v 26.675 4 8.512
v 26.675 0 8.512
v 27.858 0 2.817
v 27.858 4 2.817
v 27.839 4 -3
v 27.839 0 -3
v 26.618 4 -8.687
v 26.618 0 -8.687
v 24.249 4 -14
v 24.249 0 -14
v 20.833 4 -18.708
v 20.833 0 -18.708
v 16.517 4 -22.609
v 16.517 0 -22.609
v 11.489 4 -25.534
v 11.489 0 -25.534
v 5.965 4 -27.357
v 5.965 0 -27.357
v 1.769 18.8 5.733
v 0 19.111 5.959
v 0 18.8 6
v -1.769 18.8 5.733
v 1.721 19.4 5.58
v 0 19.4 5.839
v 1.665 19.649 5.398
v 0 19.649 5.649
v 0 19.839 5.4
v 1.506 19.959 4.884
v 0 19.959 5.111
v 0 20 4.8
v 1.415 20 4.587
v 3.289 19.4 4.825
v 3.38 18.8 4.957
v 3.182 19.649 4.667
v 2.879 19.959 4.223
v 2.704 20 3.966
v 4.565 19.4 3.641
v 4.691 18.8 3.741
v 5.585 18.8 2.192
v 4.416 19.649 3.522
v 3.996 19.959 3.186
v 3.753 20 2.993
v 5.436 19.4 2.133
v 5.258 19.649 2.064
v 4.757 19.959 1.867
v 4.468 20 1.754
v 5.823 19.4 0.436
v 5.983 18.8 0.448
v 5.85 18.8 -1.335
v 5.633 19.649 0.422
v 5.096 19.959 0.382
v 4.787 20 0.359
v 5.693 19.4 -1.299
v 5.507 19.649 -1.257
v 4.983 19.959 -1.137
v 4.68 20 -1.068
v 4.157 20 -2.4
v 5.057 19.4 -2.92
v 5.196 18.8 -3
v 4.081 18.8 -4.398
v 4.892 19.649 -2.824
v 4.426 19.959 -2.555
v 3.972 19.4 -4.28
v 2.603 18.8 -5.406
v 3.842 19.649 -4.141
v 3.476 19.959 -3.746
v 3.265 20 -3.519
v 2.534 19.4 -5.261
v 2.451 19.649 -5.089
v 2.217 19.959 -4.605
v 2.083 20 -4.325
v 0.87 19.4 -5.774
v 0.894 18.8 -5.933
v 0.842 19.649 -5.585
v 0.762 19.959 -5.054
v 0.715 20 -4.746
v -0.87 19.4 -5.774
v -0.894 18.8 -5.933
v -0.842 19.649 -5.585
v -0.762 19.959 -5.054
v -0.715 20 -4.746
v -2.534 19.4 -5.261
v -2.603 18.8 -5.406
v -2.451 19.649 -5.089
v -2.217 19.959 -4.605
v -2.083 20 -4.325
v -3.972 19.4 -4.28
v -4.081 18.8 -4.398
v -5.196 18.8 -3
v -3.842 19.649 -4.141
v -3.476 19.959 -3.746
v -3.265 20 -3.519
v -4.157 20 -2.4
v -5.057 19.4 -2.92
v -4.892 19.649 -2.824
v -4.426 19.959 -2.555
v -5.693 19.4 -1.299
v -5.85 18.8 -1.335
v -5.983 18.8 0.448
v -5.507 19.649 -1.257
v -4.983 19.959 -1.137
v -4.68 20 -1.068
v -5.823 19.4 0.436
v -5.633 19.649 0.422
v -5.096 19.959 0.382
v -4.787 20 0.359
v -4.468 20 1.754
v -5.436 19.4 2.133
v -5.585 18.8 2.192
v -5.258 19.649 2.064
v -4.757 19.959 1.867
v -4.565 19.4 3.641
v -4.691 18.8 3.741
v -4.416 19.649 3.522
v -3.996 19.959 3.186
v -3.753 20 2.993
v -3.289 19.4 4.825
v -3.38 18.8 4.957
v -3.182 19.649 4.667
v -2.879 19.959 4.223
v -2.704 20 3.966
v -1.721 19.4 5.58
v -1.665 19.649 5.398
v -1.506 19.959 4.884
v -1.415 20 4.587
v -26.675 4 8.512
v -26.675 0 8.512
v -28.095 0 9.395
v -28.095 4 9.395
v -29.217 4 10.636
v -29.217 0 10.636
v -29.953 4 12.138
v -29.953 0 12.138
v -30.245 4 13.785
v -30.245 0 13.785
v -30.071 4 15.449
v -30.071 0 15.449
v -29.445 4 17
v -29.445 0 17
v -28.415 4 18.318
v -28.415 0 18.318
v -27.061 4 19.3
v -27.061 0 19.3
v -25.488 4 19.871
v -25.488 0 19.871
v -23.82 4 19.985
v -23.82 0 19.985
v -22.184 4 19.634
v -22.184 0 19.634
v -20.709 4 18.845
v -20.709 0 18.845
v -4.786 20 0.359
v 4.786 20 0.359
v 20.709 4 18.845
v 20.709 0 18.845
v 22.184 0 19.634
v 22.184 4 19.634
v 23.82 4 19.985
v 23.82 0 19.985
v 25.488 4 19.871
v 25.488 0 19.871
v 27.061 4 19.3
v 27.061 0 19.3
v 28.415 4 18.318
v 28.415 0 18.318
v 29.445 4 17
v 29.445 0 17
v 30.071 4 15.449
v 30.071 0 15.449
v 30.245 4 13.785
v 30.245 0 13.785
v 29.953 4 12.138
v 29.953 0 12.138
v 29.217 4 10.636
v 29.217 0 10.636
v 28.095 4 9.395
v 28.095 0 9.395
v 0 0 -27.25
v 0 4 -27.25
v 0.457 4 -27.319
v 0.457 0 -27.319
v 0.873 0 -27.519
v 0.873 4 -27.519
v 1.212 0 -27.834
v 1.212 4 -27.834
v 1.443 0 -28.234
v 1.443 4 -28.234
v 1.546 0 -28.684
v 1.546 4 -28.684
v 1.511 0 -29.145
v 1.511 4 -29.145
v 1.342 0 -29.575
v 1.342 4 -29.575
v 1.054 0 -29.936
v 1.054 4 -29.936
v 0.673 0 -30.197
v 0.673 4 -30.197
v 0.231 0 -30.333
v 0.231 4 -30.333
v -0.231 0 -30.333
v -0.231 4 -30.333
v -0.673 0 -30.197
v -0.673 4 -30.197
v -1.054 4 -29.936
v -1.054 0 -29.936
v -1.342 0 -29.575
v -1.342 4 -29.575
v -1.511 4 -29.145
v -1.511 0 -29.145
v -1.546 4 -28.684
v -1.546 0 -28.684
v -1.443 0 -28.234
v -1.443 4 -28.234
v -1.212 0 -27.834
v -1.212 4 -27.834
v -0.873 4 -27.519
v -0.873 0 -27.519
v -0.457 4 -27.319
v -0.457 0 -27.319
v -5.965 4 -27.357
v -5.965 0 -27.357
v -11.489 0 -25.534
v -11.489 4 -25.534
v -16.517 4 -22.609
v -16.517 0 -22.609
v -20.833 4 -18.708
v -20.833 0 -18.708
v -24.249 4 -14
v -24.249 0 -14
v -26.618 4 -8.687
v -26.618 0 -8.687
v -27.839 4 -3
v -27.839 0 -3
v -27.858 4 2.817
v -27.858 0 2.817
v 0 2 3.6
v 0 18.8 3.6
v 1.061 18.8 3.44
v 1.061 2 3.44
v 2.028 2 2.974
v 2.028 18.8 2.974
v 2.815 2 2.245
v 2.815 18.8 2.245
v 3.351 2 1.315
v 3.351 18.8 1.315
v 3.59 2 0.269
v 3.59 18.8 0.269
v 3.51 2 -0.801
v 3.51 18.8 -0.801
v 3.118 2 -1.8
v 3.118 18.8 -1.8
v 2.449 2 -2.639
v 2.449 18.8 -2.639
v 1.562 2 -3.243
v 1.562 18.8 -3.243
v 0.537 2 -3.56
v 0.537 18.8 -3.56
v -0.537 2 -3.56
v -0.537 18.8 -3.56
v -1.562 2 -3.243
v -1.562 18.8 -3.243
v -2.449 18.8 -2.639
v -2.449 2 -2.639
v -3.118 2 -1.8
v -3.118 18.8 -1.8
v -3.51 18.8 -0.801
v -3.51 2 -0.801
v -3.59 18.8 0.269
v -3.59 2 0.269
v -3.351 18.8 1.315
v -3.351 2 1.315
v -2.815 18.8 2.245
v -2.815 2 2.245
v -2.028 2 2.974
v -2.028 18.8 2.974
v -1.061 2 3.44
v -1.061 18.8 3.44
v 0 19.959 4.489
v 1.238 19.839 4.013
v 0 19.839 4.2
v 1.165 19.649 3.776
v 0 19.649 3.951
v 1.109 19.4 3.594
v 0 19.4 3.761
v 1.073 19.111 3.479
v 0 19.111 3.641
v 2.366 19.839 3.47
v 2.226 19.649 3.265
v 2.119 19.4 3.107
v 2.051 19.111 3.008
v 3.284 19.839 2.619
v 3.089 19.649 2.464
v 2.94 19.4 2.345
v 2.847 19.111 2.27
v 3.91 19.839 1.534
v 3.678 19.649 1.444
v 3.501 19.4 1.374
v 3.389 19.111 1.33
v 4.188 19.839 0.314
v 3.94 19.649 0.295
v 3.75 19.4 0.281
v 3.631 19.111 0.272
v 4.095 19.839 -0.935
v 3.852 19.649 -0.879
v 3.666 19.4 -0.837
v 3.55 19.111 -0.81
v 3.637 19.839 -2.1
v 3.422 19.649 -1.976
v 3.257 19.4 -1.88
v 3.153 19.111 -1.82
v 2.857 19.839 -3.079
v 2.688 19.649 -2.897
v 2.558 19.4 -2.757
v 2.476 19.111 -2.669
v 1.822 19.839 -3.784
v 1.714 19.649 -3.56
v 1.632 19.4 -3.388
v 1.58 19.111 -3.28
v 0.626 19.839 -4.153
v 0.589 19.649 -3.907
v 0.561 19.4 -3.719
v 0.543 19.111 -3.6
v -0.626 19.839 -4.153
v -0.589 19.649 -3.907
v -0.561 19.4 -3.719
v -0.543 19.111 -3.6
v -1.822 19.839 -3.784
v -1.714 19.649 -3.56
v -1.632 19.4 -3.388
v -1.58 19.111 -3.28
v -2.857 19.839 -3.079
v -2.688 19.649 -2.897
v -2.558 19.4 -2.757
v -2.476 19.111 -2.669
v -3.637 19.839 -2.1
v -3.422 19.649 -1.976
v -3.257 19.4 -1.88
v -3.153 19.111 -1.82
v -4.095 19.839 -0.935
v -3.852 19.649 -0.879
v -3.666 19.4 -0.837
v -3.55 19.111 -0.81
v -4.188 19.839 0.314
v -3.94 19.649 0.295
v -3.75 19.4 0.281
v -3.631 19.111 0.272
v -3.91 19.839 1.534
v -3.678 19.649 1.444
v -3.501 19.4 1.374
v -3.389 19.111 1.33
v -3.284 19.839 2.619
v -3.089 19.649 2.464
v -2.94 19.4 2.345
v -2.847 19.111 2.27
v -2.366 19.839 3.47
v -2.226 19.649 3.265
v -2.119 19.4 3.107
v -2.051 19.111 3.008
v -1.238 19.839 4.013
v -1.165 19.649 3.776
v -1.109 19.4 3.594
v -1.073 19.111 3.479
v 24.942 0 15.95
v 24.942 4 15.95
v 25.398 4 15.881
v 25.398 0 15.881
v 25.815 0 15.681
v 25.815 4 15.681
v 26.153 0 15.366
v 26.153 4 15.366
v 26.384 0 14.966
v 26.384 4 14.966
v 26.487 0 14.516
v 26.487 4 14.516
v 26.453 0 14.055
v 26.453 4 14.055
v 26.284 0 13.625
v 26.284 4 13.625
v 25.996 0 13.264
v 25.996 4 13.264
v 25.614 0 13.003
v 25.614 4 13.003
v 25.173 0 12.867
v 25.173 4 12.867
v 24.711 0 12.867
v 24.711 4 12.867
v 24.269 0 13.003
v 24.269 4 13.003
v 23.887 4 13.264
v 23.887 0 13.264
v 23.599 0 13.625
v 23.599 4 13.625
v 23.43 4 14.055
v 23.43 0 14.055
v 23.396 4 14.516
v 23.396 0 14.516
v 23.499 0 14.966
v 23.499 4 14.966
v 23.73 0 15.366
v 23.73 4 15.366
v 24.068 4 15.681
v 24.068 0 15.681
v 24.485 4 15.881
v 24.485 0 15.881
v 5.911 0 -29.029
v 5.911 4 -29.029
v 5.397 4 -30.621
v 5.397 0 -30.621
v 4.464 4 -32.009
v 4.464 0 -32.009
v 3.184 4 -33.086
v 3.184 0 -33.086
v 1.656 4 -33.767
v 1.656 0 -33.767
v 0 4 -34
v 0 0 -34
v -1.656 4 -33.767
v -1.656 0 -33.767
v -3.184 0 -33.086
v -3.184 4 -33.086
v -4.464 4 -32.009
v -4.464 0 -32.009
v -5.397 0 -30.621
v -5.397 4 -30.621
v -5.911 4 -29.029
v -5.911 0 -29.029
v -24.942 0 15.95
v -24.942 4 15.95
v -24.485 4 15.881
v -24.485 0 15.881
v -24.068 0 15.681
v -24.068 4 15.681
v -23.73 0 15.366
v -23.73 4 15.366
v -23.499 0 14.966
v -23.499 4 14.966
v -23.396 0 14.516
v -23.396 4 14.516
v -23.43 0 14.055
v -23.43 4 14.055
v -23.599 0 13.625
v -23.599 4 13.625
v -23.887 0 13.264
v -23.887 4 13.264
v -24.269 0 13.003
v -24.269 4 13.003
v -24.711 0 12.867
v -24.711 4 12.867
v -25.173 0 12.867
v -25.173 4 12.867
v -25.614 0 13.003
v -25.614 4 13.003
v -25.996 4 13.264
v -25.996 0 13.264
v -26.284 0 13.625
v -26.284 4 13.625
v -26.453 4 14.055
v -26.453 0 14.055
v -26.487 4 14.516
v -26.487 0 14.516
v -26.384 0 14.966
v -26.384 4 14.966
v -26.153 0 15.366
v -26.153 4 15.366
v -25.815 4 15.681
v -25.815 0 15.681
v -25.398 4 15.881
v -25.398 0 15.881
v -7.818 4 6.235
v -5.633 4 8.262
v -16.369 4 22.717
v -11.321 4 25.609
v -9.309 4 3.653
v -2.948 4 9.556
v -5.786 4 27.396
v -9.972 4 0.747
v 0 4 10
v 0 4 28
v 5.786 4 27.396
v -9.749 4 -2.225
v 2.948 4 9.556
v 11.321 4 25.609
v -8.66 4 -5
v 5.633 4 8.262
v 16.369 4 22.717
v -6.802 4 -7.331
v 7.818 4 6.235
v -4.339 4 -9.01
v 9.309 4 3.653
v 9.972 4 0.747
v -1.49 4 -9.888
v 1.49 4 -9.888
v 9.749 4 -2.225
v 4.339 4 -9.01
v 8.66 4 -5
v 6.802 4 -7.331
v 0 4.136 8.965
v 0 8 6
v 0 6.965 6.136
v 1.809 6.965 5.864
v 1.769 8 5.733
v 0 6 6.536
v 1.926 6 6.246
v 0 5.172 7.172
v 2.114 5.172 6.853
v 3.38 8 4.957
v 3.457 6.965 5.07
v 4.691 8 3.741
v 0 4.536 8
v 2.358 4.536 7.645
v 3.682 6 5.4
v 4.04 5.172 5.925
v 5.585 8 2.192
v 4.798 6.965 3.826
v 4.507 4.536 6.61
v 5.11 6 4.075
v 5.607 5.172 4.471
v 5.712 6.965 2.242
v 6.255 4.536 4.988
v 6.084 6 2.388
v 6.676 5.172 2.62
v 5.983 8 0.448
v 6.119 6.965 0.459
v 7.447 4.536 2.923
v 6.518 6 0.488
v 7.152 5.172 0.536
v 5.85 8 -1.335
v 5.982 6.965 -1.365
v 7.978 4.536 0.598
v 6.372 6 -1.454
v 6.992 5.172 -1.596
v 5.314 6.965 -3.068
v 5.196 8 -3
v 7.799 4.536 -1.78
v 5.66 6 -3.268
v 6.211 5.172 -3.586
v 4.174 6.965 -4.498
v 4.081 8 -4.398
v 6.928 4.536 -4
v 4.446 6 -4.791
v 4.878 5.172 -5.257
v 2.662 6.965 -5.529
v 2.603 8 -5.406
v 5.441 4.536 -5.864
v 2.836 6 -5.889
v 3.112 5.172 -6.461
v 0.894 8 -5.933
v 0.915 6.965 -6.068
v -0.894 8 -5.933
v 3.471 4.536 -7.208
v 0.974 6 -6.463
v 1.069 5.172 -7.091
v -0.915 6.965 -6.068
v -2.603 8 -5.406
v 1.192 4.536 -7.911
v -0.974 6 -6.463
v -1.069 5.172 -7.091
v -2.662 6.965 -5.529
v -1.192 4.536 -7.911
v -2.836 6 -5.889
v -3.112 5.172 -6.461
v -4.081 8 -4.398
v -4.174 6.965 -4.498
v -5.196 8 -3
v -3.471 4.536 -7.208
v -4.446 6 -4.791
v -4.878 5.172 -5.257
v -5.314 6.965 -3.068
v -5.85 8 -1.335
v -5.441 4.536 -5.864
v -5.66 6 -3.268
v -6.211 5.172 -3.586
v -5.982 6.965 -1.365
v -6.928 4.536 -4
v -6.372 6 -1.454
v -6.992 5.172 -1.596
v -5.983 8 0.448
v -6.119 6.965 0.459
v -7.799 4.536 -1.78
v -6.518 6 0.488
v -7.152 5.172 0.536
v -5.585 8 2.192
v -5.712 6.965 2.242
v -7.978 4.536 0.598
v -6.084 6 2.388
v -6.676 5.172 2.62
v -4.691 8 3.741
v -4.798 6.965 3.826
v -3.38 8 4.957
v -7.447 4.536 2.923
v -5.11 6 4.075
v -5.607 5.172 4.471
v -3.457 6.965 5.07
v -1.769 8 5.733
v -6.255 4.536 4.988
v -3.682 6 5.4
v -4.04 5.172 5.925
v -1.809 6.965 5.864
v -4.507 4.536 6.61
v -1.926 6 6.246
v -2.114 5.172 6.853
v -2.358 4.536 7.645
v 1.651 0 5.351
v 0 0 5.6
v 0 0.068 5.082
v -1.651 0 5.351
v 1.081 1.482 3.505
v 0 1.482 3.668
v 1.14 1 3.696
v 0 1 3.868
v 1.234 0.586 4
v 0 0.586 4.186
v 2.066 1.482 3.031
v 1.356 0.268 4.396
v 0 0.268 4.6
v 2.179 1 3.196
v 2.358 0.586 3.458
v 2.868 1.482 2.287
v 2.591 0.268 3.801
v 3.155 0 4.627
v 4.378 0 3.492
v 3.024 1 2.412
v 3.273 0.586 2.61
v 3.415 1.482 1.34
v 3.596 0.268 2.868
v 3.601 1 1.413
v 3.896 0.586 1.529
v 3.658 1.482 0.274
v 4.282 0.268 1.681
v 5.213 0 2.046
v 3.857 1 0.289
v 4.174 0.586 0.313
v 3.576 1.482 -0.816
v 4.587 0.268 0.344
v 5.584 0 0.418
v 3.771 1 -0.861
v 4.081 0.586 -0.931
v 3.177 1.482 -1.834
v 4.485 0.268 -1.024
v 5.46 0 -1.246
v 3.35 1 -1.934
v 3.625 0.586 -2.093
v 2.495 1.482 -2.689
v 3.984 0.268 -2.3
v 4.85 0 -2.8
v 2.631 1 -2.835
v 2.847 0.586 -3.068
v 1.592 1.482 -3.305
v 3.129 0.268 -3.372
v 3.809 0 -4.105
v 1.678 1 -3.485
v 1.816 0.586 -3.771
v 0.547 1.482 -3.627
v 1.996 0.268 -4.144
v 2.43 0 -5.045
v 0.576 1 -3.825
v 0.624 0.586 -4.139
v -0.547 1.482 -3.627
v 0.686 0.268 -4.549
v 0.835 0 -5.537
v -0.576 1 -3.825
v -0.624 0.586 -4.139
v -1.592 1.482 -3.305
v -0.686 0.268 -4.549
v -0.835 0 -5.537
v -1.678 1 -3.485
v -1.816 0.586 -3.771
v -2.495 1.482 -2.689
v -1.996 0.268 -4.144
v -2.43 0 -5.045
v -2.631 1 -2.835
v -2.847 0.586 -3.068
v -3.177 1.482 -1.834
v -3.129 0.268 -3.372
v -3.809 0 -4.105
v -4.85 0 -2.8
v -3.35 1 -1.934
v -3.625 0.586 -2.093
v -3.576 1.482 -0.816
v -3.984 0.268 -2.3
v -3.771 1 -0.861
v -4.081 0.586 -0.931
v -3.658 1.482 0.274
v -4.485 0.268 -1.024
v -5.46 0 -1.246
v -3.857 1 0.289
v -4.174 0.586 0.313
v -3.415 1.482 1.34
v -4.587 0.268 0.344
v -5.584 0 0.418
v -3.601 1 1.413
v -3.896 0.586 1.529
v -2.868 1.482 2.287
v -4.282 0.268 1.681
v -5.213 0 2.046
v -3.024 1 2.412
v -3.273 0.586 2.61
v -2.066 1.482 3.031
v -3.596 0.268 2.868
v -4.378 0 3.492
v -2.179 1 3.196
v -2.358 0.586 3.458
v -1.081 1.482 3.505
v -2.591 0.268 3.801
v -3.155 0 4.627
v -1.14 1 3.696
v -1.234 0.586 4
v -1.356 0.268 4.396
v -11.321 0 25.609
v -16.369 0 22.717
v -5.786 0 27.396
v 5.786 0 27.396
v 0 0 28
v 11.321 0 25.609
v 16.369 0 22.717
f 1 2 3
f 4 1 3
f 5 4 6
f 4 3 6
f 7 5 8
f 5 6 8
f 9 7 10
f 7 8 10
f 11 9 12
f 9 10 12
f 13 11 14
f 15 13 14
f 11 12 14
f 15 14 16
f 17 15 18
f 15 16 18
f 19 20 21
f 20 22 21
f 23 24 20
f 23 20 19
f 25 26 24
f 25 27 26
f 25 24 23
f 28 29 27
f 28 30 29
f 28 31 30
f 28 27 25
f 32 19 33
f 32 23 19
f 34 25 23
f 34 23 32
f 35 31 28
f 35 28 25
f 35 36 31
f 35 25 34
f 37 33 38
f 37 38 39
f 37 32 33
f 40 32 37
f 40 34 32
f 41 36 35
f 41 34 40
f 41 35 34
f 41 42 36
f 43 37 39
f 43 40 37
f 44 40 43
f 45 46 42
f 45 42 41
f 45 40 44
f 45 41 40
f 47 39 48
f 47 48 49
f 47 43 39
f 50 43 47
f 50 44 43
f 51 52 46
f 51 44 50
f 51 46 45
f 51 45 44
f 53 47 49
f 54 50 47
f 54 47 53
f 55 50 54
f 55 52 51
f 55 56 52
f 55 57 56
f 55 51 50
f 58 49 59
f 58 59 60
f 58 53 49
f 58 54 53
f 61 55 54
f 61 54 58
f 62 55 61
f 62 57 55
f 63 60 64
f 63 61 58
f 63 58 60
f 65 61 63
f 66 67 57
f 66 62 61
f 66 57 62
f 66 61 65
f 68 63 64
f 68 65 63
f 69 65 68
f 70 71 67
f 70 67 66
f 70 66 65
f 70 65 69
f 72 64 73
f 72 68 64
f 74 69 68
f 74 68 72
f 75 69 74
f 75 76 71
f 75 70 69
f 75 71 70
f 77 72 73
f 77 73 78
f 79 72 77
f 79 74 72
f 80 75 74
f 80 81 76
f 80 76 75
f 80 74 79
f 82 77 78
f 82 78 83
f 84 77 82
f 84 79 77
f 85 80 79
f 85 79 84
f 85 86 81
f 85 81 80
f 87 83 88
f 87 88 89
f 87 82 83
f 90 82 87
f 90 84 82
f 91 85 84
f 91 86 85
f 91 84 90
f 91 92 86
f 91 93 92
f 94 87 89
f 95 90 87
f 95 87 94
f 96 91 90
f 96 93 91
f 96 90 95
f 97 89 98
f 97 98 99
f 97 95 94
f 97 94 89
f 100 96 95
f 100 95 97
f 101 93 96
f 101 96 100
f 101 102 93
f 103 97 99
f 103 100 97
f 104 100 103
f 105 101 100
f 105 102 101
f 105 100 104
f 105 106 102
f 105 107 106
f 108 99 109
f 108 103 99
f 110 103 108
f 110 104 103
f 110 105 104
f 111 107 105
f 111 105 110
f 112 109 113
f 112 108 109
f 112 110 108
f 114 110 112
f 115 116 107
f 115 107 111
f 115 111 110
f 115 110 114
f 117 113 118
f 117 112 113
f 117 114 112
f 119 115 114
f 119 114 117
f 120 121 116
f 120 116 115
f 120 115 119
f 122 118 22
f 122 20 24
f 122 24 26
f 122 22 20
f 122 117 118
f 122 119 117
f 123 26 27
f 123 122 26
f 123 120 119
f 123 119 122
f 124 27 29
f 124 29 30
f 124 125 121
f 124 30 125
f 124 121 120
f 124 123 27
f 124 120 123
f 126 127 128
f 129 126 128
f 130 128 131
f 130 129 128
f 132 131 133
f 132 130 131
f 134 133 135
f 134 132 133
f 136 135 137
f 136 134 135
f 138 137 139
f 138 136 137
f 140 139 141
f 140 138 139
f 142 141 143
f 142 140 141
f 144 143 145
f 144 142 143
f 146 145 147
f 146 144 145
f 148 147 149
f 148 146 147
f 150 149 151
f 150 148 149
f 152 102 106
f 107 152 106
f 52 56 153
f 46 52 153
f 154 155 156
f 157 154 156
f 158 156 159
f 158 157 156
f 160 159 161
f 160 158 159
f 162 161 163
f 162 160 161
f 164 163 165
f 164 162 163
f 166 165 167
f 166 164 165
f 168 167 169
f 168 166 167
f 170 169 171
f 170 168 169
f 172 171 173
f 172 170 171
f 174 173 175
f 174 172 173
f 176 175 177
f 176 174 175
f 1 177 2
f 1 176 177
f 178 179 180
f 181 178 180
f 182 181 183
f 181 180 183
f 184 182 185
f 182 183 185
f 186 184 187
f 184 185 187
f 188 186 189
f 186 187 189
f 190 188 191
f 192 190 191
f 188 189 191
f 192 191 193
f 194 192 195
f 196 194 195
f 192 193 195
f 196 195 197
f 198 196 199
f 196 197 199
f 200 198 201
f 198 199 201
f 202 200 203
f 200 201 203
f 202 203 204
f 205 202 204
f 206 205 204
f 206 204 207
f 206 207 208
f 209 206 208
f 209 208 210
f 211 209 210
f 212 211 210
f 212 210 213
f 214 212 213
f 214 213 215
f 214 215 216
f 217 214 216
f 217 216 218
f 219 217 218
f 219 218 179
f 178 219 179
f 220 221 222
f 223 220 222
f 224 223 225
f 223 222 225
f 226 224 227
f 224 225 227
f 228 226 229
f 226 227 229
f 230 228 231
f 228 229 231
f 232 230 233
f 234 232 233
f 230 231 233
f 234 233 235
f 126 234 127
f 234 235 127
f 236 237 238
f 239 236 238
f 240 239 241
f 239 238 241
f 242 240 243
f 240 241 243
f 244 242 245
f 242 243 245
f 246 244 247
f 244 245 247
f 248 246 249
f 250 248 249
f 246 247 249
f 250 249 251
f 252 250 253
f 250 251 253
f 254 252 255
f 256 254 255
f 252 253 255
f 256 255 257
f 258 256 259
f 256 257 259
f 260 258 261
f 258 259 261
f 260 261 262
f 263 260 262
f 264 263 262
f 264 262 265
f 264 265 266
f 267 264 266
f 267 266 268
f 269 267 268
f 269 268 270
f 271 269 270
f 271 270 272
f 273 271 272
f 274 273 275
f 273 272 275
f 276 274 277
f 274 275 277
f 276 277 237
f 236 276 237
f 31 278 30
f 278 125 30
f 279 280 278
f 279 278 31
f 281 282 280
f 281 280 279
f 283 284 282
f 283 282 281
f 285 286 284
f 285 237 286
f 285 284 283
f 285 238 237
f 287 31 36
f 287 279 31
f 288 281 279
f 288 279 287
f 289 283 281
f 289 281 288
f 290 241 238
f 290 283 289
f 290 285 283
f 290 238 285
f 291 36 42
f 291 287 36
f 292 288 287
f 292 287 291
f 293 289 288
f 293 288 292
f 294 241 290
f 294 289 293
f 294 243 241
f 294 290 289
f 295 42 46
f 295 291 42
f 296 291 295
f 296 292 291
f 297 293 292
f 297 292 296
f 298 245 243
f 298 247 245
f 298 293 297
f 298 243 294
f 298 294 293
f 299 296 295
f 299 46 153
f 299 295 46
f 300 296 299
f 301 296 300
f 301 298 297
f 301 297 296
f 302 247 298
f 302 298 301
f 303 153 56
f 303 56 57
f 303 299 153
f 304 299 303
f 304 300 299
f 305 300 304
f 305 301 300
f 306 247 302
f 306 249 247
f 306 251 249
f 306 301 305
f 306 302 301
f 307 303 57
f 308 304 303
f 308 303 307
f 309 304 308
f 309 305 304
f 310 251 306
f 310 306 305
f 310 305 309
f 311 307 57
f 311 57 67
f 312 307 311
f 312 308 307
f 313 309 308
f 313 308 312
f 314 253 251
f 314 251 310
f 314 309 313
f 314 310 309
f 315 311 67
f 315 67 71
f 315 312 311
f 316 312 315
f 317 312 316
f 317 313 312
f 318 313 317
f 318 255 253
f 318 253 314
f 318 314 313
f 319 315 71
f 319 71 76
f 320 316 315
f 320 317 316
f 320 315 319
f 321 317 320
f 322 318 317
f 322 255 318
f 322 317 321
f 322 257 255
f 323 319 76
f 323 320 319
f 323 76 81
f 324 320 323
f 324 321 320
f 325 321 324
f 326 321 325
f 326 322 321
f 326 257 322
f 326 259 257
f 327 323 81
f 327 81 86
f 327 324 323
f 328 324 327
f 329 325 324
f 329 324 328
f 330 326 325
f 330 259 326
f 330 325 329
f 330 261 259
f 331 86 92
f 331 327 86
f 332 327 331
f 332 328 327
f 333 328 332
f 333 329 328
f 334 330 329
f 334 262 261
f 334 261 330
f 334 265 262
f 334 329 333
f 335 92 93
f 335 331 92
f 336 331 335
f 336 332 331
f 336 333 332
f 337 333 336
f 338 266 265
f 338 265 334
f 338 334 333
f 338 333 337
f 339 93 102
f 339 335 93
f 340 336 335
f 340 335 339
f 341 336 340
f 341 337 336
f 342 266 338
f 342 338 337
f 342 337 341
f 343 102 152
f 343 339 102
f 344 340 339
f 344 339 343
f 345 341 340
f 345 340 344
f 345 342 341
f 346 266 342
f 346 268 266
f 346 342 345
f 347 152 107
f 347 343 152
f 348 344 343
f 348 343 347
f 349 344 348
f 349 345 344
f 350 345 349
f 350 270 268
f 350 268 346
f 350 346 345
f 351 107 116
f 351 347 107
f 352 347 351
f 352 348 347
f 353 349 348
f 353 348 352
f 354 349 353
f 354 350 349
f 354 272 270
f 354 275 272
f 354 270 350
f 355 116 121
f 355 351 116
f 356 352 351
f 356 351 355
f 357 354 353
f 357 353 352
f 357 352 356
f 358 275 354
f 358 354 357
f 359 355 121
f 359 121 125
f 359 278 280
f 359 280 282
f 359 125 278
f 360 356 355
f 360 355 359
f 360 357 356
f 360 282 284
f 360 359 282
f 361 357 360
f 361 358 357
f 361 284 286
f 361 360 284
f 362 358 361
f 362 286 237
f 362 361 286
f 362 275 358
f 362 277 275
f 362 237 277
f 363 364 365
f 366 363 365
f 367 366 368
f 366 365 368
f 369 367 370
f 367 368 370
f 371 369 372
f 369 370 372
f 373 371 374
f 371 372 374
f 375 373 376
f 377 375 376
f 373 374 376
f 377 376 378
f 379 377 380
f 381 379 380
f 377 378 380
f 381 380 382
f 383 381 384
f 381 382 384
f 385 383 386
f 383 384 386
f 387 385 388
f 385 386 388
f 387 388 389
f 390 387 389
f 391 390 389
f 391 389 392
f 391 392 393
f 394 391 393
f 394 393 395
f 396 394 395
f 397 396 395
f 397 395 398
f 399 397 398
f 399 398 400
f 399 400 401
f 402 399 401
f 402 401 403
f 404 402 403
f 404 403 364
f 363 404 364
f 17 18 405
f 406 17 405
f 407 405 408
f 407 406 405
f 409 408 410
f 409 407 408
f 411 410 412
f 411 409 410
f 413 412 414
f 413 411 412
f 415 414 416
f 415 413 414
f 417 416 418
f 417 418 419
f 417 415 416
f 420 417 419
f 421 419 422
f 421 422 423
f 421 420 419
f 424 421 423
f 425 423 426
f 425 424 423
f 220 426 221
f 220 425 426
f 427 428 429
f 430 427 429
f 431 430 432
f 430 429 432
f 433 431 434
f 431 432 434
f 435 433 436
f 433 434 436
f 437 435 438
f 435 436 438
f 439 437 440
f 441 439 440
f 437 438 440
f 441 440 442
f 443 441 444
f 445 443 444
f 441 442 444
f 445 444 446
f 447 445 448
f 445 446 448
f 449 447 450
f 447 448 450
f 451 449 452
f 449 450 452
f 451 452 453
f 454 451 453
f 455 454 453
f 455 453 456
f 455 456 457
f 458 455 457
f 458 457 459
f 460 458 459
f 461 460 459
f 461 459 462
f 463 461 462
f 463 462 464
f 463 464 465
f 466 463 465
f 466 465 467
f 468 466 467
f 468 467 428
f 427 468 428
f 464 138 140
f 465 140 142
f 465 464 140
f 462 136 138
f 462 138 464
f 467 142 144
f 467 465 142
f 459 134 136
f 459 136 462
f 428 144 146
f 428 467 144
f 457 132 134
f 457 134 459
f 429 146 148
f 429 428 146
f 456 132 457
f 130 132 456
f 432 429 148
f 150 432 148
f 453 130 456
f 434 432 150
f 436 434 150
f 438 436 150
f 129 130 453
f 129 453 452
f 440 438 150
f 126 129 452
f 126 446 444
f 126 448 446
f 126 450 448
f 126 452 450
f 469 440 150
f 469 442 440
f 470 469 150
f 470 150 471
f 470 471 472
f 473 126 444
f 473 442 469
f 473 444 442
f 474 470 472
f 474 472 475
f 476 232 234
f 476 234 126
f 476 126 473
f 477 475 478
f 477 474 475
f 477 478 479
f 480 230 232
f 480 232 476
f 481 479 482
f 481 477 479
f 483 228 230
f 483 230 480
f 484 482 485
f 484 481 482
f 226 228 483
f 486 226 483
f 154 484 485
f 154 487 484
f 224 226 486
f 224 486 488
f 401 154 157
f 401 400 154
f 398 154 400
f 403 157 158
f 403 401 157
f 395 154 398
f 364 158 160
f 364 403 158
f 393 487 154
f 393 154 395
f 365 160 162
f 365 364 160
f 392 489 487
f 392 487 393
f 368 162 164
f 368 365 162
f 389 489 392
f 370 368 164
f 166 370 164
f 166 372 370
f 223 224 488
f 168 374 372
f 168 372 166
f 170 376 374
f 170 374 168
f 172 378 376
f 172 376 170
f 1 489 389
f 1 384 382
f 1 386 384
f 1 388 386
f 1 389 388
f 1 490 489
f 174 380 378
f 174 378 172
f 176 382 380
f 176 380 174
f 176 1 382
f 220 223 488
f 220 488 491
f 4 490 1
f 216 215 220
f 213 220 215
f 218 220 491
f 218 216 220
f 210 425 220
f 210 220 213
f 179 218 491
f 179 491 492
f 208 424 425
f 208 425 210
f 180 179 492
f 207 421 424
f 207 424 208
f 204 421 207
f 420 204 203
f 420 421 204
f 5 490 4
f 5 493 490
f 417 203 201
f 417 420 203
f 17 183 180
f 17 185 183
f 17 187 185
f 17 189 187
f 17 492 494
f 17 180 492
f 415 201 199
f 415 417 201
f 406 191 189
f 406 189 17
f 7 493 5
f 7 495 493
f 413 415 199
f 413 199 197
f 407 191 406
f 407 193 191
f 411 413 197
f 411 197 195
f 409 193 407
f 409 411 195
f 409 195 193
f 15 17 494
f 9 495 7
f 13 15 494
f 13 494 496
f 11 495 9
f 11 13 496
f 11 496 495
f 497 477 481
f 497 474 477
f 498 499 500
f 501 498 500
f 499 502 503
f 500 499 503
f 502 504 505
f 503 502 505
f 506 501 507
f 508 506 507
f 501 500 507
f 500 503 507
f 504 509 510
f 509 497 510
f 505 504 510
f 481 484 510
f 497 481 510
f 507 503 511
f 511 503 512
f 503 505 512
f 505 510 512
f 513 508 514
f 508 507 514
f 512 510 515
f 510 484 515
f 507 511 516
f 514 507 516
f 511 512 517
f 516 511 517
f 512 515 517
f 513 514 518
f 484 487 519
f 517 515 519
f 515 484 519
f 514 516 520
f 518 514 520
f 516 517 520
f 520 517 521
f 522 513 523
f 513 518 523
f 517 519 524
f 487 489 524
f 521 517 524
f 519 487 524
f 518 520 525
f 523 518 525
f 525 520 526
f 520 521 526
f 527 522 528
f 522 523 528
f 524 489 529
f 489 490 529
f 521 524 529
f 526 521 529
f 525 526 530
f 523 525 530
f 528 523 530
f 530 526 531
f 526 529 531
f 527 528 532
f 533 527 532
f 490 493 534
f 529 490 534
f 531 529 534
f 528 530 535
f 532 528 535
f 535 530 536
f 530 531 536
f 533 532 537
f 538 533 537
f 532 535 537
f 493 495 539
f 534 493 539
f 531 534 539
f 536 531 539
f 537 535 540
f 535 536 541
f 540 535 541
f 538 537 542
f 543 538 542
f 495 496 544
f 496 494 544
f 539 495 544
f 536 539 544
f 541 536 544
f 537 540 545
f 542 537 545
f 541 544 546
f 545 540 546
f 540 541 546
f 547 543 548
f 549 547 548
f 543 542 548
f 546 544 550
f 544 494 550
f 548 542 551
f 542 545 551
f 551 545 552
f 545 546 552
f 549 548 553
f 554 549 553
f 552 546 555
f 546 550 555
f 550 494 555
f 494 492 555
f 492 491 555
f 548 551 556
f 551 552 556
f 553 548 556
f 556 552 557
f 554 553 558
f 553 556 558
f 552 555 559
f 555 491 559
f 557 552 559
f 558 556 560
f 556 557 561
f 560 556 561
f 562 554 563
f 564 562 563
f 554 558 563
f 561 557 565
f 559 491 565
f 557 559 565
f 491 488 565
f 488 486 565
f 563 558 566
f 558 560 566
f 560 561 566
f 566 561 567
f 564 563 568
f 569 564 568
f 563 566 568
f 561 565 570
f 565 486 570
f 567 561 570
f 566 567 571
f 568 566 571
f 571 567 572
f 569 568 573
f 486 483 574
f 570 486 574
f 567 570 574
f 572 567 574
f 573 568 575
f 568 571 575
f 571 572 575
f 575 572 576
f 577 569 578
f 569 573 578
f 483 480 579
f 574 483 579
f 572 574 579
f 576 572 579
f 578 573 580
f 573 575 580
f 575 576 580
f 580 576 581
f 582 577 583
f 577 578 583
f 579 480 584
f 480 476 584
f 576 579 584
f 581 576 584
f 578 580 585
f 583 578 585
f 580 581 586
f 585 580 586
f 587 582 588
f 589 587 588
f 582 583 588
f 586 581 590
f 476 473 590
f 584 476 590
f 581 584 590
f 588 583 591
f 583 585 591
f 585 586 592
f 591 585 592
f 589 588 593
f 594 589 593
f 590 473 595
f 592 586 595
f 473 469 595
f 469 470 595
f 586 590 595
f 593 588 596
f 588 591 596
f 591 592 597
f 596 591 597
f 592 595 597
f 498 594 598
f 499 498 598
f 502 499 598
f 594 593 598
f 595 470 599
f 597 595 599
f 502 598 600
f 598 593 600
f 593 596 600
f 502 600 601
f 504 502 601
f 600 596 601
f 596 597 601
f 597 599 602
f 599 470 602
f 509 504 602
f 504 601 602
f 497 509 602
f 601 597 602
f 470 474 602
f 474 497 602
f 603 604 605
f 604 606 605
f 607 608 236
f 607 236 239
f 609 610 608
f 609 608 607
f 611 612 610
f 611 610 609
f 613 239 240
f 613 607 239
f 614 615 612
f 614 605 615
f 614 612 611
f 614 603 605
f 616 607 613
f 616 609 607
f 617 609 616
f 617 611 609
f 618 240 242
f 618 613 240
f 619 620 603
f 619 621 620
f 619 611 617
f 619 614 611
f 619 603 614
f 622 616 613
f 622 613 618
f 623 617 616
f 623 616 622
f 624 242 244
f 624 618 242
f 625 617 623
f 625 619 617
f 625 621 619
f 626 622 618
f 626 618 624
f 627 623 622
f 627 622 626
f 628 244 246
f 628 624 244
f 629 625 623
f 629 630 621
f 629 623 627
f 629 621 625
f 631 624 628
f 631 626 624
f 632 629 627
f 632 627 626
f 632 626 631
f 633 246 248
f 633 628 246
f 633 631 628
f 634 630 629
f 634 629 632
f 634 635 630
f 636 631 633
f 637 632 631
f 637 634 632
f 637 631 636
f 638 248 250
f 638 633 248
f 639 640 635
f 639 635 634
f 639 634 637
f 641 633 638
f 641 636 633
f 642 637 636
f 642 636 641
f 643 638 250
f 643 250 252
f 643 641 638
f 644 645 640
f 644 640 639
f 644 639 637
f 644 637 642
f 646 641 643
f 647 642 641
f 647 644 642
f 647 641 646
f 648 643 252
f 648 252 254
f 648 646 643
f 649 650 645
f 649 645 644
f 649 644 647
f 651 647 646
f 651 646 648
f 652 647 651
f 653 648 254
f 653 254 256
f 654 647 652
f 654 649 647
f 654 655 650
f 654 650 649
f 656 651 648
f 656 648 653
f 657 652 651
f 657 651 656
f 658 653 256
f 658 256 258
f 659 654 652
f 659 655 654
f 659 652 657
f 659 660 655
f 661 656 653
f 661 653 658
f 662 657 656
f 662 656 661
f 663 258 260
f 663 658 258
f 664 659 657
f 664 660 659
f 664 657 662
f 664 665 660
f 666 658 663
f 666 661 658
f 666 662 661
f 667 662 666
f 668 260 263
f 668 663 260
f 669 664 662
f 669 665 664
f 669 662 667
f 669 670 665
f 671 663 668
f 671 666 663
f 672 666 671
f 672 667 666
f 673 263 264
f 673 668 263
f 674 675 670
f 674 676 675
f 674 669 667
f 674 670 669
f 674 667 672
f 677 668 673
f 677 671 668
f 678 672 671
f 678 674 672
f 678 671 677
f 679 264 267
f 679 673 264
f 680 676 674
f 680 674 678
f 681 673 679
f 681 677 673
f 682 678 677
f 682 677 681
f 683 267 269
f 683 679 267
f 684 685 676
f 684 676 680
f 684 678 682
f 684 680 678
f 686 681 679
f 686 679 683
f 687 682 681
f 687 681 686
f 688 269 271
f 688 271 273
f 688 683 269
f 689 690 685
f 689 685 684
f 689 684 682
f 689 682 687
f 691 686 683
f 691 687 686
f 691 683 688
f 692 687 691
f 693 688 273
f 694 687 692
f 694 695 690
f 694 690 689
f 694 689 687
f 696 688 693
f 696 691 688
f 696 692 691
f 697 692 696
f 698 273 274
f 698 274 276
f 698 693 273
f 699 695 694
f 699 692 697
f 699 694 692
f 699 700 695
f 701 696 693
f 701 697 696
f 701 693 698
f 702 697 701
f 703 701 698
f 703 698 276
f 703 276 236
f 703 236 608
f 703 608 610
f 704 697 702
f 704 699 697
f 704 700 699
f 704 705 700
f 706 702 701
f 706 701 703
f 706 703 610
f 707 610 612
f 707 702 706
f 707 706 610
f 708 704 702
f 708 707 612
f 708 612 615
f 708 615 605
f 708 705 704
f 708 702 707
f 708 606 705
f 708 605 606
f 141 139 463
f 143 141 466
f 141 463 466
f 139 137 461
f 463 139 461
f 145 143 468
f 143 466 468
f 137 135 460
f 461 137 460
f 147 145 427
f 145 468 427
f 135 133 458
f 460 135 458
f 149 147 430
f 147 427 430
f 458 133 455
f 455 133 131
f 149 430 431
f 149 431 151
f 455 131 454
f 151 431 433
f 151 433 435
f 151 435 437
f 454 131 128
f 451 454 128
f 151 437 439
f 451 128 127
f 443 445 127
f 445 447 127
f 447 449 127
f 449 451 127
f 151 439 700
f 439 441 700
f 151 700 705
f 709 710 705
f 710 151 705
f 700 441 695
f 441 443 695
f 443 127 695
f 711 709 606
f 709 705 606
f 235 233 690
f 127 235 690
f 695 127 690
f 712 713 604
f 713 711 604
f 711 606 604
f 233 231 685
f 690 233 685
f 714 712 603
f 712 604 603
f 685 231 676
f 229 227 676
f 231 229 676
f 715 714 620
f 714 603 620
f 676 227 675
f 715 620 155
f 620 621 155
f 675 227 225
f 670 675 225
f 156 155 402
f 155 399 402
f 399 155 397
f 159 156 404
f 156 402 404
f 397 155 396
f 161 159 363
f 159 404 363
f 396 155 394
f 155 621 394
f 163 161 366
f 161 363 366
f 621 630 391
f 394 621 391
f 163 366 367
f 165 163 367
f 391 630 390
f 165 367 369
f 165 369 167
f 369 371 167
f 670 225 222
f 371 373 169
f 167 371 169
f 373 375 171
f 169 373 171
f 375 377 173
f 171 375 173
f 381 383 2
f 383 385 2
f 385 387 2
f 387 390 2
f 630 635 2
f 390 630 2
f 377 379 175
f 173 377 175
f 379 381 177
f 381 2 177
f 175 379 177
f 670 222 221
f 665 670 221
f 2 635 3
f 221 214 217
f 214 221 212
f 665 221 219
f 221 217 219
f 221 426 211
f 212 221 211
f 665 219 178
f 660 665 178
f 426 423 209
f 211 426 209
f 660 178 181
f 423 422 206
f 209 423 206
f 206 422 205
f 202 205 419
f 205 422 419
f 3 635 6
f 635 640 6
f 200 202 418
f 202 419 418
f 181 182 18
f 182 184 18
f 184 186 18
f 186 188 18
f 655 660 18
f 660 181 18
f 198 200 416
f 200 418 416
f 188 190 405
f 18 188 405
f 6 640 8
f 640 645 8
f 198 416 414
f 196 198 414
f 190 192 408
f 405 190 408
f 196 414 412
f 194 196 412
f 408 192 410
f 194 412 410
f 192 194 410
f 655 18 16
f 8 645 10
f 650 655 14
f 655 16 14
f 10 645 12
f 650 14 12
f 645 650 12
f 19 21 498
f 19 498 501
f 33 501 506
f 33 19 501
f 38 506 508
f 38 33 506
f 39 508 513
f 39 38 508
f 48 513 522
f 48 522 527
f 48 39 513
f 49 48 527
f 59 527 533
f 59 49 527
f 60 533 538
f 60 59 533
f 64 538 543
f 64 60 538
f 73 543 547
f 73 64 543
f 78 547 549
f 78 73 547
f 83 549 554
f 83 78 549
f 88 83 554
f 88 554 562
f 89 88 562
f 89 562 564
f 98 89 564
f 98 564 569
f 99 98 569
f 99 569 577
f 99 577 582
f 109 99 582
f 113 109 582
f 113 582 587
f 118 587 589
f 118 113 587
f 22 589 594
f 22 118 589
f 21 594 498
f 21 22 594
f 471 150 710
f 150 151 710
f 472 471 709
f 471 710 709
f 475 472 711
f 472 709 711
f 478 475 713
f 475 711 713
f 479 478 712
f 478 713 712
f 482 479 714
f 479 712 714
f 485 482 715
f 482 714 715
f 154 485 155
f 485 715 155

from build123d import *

# Parameters (mm, degrees)
SKETCH1_R           = 28
BOSS_EXTRUDE1_DEPTH = 4
SKETCH2_R           = 6
BOSS_EXTRUDE2_DEPTH = 4
SKETCH3_R           = 1.55
CUT_EXTRUDE1_DEPTH  = 46.683525867
SKETCH4_R           = 3.6
CUT_EXTRUDE2_DEPTH  = 46.683525867
BOSS_EXTRUDE3_START = 16
SKETCH5_R           = 6
SKETCH5_R_2         = 3.6
BOSS_EXTRUDE3_DEPTH = 16
FILLET1_R           = 4
FILLET2_R           = 1.2
FILLET3_R           = 2


with BuildPart() as part:
    # Sketch1 → Boss-Extrude1 (new body)
    with BuildSketch(Plane(origin=(0, 0, 0), x_dir=(1, 0, 0), z_dir=(0, 1, 0))):
        with Locations(Location((0, 0, 0), (0, 0, 270))):
            Circle(SKETCH1_R)
    extrude(amount=BOSS_EXTRUDE1_DEPTH)

    # Sketch2 → Boss-Extrude2 (add)
    with BuildSketch(Plane(origin=(0, 4, 0), x_dir=(1, 0, 0), z_dir=(0, 1, 0))):
        with Locations((0, 28)):
            Circle(SKETCH2_R)
        with Locations((24.248711306, -14)):
            Circle(SKETCH2_R)
        with Locations((-24.248711306, -14)):
            Circle(SKETCH2_R)
    extrude(amount=-BOSS_EXTRUDE2_DEPTH)

    # Sketch3 → Cut-Extrude1 (cut, through all)
    with BuildSketch(Plane(origin=(0, 4, 0), x_dir=(1, 0, 0), z_dir=(0, 1, 0))):
        with Locations(Location((0, 28.8, 0), (0, 0, 270))):
            Circle(SKETCH3_R)
        with Locations(Location((24.941531629, -14.4, 0), (0, 0, 270))):
            Circle(SKETCH3_R)
        with Locations(Location((-24.941531629, -14.4, 0), (0, 0, 270))):
            Circle(SKETCH3_R)
    extrude(amount=-CUT_EXTRUDE1_DEPTH, mode=Mode.SUBTRACT)

    # Sketch4 → Cut-Extrude2 (cut, through all)
    with BuildSketch(Plane(origin=(0, 4, 0), x_dir=(1, 0, 0), z_dir=(0, 1, 0))):
        with Locations(Location((0, 0, 0), (0, 0, 270))):
            Circle(SKETCH4_R)
    extrude(amount=-CUT_EXTRUDE2_DEPTH, mode=Mode.SUBTRACT)

    # Sketch5 → Boss-Extrude3 (add)
    with BuildSketch(Plane(origin=(0, 4, 0), x_dir=(1, 0, 0), z_dir=(0, 1, 0)).offset(BOSS_EXTRUDE3_START)):
        with Locations(Location((0, 0, 0), (0, 0, 270))):
            Circle(SKETCH5_R)
        with Locations(Location((0, 0, 0), (0, 0, 270))):
            Circle(SKETCH5_R_2, mode=Mode.SUBTRACT)
    extrude(amount=-BOSS_EXTRUDE3_DEPTH)

    # Fillet1
    fillet1_edges = [part.edges().sort_by_distance(p)[0] for p in [
        (0, 4, -6),
    ]]
    fillet(fillet1_edges, radius=FILLET1_R)

    # Fillet2
    fillet2_edges = [part.edges().sort_by_distance(p)[0] for p in [
        (0, 20, -6),
        (0, 20, -3.6),
    ]]
    fillet(fillet2_edges, radius=FILLET2_R - 0.0001)  # a hair under: the kernel refuses the full size

    # Fillet3
    fillet3_edges = [part.edges().sort_by_distance(p)[0] for p in [
        (0, 0, -3.6),
    ]]
    fillet(fillet3_edges, radius=FILLET3_R)


solid = part.part
